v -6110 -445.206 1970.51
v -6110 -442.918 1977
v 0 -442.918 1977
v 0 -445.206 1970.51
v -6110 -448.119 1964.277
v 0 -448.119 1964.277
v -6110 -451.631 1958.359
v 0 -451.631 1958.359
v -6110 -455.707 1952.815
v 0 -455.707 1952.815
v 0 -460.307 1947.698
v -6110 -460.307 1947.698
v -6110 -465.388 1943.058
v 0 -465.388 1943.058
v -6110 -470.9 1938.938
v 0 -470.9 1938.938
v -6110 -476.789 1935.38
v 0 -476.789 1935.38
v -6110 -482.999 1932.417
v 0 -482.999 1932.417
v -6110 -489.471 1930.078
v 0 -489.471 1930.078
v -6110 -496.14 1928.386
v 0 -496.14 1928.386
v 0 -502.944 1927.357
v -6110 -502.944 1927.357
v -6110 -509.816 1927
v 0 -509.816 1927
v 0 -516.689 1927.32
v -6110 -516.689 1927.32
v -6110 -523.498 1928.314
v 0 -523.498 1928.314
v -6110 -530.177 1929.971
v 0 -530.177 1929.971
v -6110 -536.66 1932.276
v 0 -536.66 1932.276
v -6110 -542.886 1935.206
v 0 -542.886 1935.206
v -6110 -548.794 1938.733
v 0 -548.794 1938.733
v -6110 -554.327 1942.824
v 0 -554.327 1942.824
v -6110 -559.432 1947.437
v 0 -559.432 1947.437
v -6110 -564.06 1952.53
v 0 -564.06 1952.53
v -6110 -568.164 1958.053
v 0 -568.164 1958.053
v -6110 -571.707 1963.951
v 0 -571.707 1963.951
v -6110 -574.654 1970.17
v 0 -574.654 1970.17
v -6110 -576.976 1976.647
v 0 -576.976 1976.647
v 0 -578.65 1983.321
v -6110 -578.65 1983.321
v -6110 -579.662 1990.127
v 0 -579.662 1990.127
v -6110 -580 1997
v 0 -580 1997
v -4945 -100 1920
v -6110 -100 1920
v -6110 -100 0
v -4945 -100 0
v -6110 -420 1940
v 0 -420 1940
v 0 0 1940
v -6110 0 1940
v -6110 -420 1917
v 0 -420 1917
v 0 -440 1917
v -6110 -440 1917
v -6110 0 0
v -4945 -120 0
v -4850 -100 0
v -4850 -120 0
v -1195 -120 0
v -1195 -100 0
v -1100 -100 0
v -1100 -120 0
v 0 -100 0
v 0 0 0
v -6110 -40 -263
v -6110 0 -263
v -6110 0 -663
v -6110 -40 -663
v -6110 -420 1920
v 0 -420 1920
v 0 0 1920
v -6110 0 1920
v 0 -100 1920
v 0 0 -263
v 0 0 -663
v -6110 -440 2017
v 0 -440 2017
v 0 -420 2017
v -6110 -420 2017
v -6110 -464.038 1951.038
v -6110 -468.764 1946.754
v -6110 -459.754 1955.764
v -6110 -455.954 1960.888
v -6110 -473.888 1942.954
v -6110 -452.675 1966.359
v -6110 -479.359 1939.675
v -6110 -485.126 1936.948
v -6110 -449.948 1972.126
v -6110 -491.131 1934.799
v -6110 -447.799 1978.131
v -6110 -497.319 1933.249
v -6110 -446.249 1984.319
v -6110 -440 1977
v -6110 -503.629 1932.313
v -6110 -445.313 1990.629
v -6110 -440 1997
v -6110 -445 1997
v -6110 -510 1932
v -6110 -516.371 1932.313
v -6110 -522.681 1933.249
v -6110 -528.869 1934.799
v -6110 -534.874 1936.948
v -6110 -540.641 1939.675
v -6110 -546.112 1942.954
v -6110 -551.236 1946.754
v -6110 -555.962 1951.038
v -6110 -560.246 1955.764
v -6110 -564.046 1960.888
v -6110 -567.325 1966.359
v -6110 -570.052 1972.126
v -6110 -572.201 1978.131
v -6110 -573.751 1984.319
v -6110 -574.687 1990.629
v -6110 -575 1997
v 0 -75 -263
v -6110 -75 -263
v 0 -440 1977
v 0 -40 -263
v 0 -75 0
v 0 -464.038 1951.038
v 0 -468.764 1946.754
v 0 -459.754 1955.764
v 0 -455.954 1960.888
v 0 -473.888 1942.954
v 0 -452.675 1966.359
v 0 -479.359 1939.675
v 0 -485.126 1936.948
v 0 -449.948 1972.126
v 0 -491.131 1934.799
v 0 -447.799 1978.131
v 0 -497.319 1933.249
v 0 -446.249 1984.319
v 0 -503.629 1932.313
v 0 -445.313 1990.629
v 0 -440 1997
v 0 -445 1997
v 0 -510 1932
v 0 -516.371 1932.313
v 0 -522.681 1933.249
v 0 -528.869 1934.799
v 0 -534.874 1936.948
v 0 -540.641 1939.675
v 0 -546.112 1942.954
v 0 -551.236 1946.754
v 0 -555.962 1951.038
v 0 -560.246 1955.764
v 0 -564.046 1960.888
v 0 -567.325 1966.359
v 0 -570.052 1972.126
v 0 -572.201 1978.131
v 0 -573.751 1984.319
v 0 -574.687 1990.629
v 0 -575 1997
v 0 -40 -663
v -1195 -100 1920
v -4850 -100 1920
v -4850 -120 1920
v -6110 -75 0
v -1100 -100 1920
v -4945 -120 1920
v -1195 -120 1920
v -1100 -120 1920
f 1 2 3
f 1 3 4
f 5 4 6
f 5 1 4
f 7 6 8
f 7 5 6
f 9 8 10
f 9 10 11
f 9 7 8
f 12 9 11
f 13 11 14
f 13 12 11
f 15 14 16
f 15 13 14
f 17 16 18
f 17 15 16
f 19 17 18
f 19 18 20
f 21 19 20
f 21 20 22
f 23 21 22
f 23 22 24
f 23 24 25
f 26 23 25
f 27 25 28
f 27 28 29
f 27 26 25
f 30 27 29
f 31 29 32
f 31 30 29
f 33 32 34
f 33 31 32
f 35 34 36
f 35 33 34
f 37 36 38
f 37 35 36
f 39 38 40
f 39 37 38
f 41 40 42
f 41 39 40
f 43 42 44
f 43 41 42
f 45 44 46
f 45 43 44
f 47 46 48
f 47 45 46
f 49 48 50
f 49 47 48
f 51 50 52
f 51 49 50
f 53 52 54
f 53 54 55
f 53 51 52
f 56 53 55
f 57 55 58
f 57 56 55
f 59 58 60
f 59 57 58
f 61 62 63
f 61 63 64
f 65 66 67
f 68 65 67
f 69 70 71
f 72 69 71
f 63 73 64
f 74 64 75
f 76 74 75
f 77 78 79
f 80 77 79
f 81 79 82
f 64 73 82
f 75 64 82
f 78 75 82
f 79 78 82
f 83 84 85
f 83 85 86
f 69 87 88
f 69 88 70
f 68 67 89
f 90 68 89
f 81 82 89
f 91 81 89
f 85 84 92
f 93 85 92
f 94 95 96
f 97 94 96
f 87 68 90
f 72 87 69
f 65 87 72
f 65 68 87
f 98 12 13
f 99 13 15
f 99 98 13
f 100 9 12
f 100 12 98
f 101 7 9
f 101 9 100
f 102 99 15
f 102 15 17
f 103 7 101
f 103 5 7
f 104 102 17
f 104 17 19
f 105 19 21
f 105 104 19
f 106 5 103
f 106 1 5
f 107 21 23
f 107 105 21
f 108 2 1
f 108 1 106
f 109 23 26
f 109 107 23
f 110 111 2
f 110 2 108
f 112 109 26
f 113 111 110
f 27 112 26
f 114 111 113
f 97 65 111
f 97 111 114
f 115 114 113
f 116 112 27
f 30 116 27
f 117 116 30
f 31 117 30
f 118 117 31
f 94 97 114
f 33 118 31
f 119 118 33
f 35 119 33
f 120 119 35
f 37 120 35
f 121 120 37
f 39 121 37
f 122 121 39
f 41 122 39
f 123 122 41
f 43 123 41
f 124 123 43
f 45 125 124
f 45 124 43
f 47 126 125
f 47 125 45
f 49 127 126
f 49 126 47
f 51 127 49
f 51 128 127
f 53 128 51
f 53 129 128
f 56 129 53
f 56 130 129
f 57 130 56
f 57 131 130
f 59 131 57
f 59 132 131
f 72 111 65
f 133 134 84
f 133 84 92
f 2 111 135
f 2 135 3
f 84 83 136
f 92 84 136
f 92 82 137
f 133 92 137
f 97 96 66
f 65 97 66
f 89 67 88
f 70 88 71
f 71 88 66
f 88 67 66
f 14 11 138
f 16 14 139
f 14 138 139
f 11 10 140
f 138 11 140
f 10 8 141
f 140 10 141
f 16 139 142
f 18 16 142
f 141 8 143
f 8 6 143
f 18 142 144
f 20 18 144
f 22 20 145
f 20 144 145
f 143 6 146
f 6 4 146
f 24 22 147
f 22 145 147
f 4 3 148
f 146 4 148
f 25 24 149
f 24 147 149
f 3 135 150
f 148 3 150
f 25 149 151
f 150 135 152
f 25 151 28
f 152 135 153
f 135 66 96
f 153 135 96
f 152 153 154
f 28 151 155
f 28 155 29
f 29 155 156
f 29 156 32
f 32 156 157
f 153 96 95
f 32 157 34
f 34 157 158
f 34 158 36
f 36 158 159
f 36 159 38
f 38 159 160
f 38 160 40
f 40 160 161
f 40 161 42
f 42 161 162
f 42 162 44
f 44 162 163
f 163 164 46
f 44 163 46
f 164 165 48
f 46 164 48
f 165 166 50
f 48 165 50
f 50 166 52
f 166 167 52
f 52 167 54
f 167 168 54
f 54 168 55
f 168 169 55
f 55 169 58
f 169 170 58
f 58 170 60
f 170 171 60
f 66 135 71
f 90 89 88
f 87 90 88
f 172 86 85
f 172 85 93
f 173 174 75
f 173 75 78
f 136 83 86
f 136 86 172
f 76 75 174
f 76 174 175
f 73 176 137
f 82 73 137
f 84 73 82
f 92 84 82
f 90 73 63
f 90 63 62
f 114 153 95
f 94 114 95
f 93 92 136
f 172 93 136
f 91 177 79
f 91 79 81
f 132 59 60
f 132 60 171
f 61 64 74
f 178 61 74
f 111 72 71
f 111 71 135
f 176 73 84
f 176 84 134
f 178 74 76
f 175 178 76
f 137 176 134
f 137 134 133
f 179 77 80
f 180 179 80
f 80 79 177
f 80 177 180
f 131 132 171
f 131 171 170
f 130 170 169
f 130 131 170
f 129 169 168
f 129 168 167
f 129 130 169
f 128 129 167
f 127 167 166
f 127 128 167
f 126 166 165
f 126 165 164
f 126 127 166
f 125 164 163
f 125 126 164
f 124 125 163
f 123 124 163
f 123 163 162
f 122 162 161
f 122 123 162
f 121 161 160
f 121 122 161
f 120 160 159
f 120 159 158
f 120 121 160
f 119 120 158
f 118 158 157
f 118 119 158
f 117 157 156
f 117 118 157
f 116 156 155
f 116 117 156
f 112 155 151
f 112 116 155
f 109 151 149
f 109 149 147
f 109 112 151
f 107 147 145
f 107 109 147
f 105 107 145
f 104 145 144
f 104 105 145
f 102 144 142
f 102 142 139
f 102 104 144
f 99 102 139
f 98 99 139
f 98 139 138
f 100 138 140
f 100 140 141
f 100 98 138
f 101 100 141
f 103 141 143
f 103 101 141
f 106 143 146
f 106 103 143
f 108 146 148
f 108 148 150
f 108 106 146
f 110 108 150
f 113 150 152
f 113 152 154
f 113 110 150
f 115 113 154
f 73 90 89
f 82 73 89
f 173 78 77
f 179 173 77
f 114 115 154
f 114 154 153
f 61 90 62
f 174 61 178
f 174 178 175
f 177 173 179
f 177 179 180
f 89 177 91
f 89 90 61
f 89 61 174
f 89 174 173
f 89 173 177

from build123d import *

# Parameters (mm, degrees)
F0_W     = 6110
F0_H     = 1920
F1_DEPTH = 100
F2_W     = 95
F2_H     = 20
F3_DEPTH = 1920
F5_DEPTH = 6110
F6_W     = 6110
F6_H     = 75
F7_DEPTH = 263
F8_W     = 6110
F8_H     = 40
F9_DEPTH = 400


with BuildPart() as f1:
    # F0 (on Front) → F1 (new body)
    with BuildSketch(Plane.XZ):
        with Locations((-3055, 960)):
            Rectangle(F0_W, F0_H)
    extrude(amount=F1_DEPTH)

    # F2 (on face) → F3 (join, through all)
    with BuildSketch(Plane(origin=(0, 0, 0), x_dir=(1, 0, 0), z_dir=(0, 0, -1))):
        with Locations((-4897.5, 110)):
            Rectangle(F2_W, F2_H)
        with Locations((-1147.5, 110)):
            Rectangle(F2_W, F2_H)
    extrude(amount=-F3_DEPTH)


with BuildPart() as f5:
    # F4 (on face) → F5 (new body, through all)
    with BuildSketch(Plane(origin=(-6110, 0, 0), x_dir=(0, -1, 0), z_dir=(-1, 0, 0))):
        Polygon((0, 1940), (0, 1920), (100, 1920), (420, 1920), (420, 1940), align=None)
        Polygon((420, 1940), (420, 1920), (420, 1917), (440, 1917), (440, 1977), (440, 1997), (440, 2017), (420, 2017), align=None)
        with BuildLine():
            Line((440, 1997), (440, 1977))
            Line((440, 1977), (442.917960675, 1977))
            ThreePointArc((442.917960675, 1977), (520.1058707505, 1927.7333314185), (580, 1997))
            Line((580, 1997), (575, 1997))
            ThreePointArc((575, 1997), (510, 1932), (445, 1997))
            Line((445, 1997), (440, 1997))
        make_face()
    extrude(amount=-F5_DEPTH)


with BuildPart() as f7:
    # F6 (on face) → F7 (new body)
    with BuildSketch(Plane(origin=(0, 0, 0), x_dir=(1, 0, 0), z_dir=(0, 0, -1))):
        with Locations((-3055, 37.5)):
            Rectangle(F6_W, F6_H)
    extrude(amount=F7_DEPTH)


with BuildPart() as f9:
    # F8 (on face) → F9 (new body)
    with BuildSketch(Plane(origin=(0, 0, -263), x_dir=(1, 0, 0), z_dir=(0, 0, -1))):
        with Locations((-3055, 20)):
            Rectangle(F8_W, F8_H)
    extrude(amount=F9_DEPTH)


solid = Compound([f1.part, f5.part, f7.part, f9.part])
